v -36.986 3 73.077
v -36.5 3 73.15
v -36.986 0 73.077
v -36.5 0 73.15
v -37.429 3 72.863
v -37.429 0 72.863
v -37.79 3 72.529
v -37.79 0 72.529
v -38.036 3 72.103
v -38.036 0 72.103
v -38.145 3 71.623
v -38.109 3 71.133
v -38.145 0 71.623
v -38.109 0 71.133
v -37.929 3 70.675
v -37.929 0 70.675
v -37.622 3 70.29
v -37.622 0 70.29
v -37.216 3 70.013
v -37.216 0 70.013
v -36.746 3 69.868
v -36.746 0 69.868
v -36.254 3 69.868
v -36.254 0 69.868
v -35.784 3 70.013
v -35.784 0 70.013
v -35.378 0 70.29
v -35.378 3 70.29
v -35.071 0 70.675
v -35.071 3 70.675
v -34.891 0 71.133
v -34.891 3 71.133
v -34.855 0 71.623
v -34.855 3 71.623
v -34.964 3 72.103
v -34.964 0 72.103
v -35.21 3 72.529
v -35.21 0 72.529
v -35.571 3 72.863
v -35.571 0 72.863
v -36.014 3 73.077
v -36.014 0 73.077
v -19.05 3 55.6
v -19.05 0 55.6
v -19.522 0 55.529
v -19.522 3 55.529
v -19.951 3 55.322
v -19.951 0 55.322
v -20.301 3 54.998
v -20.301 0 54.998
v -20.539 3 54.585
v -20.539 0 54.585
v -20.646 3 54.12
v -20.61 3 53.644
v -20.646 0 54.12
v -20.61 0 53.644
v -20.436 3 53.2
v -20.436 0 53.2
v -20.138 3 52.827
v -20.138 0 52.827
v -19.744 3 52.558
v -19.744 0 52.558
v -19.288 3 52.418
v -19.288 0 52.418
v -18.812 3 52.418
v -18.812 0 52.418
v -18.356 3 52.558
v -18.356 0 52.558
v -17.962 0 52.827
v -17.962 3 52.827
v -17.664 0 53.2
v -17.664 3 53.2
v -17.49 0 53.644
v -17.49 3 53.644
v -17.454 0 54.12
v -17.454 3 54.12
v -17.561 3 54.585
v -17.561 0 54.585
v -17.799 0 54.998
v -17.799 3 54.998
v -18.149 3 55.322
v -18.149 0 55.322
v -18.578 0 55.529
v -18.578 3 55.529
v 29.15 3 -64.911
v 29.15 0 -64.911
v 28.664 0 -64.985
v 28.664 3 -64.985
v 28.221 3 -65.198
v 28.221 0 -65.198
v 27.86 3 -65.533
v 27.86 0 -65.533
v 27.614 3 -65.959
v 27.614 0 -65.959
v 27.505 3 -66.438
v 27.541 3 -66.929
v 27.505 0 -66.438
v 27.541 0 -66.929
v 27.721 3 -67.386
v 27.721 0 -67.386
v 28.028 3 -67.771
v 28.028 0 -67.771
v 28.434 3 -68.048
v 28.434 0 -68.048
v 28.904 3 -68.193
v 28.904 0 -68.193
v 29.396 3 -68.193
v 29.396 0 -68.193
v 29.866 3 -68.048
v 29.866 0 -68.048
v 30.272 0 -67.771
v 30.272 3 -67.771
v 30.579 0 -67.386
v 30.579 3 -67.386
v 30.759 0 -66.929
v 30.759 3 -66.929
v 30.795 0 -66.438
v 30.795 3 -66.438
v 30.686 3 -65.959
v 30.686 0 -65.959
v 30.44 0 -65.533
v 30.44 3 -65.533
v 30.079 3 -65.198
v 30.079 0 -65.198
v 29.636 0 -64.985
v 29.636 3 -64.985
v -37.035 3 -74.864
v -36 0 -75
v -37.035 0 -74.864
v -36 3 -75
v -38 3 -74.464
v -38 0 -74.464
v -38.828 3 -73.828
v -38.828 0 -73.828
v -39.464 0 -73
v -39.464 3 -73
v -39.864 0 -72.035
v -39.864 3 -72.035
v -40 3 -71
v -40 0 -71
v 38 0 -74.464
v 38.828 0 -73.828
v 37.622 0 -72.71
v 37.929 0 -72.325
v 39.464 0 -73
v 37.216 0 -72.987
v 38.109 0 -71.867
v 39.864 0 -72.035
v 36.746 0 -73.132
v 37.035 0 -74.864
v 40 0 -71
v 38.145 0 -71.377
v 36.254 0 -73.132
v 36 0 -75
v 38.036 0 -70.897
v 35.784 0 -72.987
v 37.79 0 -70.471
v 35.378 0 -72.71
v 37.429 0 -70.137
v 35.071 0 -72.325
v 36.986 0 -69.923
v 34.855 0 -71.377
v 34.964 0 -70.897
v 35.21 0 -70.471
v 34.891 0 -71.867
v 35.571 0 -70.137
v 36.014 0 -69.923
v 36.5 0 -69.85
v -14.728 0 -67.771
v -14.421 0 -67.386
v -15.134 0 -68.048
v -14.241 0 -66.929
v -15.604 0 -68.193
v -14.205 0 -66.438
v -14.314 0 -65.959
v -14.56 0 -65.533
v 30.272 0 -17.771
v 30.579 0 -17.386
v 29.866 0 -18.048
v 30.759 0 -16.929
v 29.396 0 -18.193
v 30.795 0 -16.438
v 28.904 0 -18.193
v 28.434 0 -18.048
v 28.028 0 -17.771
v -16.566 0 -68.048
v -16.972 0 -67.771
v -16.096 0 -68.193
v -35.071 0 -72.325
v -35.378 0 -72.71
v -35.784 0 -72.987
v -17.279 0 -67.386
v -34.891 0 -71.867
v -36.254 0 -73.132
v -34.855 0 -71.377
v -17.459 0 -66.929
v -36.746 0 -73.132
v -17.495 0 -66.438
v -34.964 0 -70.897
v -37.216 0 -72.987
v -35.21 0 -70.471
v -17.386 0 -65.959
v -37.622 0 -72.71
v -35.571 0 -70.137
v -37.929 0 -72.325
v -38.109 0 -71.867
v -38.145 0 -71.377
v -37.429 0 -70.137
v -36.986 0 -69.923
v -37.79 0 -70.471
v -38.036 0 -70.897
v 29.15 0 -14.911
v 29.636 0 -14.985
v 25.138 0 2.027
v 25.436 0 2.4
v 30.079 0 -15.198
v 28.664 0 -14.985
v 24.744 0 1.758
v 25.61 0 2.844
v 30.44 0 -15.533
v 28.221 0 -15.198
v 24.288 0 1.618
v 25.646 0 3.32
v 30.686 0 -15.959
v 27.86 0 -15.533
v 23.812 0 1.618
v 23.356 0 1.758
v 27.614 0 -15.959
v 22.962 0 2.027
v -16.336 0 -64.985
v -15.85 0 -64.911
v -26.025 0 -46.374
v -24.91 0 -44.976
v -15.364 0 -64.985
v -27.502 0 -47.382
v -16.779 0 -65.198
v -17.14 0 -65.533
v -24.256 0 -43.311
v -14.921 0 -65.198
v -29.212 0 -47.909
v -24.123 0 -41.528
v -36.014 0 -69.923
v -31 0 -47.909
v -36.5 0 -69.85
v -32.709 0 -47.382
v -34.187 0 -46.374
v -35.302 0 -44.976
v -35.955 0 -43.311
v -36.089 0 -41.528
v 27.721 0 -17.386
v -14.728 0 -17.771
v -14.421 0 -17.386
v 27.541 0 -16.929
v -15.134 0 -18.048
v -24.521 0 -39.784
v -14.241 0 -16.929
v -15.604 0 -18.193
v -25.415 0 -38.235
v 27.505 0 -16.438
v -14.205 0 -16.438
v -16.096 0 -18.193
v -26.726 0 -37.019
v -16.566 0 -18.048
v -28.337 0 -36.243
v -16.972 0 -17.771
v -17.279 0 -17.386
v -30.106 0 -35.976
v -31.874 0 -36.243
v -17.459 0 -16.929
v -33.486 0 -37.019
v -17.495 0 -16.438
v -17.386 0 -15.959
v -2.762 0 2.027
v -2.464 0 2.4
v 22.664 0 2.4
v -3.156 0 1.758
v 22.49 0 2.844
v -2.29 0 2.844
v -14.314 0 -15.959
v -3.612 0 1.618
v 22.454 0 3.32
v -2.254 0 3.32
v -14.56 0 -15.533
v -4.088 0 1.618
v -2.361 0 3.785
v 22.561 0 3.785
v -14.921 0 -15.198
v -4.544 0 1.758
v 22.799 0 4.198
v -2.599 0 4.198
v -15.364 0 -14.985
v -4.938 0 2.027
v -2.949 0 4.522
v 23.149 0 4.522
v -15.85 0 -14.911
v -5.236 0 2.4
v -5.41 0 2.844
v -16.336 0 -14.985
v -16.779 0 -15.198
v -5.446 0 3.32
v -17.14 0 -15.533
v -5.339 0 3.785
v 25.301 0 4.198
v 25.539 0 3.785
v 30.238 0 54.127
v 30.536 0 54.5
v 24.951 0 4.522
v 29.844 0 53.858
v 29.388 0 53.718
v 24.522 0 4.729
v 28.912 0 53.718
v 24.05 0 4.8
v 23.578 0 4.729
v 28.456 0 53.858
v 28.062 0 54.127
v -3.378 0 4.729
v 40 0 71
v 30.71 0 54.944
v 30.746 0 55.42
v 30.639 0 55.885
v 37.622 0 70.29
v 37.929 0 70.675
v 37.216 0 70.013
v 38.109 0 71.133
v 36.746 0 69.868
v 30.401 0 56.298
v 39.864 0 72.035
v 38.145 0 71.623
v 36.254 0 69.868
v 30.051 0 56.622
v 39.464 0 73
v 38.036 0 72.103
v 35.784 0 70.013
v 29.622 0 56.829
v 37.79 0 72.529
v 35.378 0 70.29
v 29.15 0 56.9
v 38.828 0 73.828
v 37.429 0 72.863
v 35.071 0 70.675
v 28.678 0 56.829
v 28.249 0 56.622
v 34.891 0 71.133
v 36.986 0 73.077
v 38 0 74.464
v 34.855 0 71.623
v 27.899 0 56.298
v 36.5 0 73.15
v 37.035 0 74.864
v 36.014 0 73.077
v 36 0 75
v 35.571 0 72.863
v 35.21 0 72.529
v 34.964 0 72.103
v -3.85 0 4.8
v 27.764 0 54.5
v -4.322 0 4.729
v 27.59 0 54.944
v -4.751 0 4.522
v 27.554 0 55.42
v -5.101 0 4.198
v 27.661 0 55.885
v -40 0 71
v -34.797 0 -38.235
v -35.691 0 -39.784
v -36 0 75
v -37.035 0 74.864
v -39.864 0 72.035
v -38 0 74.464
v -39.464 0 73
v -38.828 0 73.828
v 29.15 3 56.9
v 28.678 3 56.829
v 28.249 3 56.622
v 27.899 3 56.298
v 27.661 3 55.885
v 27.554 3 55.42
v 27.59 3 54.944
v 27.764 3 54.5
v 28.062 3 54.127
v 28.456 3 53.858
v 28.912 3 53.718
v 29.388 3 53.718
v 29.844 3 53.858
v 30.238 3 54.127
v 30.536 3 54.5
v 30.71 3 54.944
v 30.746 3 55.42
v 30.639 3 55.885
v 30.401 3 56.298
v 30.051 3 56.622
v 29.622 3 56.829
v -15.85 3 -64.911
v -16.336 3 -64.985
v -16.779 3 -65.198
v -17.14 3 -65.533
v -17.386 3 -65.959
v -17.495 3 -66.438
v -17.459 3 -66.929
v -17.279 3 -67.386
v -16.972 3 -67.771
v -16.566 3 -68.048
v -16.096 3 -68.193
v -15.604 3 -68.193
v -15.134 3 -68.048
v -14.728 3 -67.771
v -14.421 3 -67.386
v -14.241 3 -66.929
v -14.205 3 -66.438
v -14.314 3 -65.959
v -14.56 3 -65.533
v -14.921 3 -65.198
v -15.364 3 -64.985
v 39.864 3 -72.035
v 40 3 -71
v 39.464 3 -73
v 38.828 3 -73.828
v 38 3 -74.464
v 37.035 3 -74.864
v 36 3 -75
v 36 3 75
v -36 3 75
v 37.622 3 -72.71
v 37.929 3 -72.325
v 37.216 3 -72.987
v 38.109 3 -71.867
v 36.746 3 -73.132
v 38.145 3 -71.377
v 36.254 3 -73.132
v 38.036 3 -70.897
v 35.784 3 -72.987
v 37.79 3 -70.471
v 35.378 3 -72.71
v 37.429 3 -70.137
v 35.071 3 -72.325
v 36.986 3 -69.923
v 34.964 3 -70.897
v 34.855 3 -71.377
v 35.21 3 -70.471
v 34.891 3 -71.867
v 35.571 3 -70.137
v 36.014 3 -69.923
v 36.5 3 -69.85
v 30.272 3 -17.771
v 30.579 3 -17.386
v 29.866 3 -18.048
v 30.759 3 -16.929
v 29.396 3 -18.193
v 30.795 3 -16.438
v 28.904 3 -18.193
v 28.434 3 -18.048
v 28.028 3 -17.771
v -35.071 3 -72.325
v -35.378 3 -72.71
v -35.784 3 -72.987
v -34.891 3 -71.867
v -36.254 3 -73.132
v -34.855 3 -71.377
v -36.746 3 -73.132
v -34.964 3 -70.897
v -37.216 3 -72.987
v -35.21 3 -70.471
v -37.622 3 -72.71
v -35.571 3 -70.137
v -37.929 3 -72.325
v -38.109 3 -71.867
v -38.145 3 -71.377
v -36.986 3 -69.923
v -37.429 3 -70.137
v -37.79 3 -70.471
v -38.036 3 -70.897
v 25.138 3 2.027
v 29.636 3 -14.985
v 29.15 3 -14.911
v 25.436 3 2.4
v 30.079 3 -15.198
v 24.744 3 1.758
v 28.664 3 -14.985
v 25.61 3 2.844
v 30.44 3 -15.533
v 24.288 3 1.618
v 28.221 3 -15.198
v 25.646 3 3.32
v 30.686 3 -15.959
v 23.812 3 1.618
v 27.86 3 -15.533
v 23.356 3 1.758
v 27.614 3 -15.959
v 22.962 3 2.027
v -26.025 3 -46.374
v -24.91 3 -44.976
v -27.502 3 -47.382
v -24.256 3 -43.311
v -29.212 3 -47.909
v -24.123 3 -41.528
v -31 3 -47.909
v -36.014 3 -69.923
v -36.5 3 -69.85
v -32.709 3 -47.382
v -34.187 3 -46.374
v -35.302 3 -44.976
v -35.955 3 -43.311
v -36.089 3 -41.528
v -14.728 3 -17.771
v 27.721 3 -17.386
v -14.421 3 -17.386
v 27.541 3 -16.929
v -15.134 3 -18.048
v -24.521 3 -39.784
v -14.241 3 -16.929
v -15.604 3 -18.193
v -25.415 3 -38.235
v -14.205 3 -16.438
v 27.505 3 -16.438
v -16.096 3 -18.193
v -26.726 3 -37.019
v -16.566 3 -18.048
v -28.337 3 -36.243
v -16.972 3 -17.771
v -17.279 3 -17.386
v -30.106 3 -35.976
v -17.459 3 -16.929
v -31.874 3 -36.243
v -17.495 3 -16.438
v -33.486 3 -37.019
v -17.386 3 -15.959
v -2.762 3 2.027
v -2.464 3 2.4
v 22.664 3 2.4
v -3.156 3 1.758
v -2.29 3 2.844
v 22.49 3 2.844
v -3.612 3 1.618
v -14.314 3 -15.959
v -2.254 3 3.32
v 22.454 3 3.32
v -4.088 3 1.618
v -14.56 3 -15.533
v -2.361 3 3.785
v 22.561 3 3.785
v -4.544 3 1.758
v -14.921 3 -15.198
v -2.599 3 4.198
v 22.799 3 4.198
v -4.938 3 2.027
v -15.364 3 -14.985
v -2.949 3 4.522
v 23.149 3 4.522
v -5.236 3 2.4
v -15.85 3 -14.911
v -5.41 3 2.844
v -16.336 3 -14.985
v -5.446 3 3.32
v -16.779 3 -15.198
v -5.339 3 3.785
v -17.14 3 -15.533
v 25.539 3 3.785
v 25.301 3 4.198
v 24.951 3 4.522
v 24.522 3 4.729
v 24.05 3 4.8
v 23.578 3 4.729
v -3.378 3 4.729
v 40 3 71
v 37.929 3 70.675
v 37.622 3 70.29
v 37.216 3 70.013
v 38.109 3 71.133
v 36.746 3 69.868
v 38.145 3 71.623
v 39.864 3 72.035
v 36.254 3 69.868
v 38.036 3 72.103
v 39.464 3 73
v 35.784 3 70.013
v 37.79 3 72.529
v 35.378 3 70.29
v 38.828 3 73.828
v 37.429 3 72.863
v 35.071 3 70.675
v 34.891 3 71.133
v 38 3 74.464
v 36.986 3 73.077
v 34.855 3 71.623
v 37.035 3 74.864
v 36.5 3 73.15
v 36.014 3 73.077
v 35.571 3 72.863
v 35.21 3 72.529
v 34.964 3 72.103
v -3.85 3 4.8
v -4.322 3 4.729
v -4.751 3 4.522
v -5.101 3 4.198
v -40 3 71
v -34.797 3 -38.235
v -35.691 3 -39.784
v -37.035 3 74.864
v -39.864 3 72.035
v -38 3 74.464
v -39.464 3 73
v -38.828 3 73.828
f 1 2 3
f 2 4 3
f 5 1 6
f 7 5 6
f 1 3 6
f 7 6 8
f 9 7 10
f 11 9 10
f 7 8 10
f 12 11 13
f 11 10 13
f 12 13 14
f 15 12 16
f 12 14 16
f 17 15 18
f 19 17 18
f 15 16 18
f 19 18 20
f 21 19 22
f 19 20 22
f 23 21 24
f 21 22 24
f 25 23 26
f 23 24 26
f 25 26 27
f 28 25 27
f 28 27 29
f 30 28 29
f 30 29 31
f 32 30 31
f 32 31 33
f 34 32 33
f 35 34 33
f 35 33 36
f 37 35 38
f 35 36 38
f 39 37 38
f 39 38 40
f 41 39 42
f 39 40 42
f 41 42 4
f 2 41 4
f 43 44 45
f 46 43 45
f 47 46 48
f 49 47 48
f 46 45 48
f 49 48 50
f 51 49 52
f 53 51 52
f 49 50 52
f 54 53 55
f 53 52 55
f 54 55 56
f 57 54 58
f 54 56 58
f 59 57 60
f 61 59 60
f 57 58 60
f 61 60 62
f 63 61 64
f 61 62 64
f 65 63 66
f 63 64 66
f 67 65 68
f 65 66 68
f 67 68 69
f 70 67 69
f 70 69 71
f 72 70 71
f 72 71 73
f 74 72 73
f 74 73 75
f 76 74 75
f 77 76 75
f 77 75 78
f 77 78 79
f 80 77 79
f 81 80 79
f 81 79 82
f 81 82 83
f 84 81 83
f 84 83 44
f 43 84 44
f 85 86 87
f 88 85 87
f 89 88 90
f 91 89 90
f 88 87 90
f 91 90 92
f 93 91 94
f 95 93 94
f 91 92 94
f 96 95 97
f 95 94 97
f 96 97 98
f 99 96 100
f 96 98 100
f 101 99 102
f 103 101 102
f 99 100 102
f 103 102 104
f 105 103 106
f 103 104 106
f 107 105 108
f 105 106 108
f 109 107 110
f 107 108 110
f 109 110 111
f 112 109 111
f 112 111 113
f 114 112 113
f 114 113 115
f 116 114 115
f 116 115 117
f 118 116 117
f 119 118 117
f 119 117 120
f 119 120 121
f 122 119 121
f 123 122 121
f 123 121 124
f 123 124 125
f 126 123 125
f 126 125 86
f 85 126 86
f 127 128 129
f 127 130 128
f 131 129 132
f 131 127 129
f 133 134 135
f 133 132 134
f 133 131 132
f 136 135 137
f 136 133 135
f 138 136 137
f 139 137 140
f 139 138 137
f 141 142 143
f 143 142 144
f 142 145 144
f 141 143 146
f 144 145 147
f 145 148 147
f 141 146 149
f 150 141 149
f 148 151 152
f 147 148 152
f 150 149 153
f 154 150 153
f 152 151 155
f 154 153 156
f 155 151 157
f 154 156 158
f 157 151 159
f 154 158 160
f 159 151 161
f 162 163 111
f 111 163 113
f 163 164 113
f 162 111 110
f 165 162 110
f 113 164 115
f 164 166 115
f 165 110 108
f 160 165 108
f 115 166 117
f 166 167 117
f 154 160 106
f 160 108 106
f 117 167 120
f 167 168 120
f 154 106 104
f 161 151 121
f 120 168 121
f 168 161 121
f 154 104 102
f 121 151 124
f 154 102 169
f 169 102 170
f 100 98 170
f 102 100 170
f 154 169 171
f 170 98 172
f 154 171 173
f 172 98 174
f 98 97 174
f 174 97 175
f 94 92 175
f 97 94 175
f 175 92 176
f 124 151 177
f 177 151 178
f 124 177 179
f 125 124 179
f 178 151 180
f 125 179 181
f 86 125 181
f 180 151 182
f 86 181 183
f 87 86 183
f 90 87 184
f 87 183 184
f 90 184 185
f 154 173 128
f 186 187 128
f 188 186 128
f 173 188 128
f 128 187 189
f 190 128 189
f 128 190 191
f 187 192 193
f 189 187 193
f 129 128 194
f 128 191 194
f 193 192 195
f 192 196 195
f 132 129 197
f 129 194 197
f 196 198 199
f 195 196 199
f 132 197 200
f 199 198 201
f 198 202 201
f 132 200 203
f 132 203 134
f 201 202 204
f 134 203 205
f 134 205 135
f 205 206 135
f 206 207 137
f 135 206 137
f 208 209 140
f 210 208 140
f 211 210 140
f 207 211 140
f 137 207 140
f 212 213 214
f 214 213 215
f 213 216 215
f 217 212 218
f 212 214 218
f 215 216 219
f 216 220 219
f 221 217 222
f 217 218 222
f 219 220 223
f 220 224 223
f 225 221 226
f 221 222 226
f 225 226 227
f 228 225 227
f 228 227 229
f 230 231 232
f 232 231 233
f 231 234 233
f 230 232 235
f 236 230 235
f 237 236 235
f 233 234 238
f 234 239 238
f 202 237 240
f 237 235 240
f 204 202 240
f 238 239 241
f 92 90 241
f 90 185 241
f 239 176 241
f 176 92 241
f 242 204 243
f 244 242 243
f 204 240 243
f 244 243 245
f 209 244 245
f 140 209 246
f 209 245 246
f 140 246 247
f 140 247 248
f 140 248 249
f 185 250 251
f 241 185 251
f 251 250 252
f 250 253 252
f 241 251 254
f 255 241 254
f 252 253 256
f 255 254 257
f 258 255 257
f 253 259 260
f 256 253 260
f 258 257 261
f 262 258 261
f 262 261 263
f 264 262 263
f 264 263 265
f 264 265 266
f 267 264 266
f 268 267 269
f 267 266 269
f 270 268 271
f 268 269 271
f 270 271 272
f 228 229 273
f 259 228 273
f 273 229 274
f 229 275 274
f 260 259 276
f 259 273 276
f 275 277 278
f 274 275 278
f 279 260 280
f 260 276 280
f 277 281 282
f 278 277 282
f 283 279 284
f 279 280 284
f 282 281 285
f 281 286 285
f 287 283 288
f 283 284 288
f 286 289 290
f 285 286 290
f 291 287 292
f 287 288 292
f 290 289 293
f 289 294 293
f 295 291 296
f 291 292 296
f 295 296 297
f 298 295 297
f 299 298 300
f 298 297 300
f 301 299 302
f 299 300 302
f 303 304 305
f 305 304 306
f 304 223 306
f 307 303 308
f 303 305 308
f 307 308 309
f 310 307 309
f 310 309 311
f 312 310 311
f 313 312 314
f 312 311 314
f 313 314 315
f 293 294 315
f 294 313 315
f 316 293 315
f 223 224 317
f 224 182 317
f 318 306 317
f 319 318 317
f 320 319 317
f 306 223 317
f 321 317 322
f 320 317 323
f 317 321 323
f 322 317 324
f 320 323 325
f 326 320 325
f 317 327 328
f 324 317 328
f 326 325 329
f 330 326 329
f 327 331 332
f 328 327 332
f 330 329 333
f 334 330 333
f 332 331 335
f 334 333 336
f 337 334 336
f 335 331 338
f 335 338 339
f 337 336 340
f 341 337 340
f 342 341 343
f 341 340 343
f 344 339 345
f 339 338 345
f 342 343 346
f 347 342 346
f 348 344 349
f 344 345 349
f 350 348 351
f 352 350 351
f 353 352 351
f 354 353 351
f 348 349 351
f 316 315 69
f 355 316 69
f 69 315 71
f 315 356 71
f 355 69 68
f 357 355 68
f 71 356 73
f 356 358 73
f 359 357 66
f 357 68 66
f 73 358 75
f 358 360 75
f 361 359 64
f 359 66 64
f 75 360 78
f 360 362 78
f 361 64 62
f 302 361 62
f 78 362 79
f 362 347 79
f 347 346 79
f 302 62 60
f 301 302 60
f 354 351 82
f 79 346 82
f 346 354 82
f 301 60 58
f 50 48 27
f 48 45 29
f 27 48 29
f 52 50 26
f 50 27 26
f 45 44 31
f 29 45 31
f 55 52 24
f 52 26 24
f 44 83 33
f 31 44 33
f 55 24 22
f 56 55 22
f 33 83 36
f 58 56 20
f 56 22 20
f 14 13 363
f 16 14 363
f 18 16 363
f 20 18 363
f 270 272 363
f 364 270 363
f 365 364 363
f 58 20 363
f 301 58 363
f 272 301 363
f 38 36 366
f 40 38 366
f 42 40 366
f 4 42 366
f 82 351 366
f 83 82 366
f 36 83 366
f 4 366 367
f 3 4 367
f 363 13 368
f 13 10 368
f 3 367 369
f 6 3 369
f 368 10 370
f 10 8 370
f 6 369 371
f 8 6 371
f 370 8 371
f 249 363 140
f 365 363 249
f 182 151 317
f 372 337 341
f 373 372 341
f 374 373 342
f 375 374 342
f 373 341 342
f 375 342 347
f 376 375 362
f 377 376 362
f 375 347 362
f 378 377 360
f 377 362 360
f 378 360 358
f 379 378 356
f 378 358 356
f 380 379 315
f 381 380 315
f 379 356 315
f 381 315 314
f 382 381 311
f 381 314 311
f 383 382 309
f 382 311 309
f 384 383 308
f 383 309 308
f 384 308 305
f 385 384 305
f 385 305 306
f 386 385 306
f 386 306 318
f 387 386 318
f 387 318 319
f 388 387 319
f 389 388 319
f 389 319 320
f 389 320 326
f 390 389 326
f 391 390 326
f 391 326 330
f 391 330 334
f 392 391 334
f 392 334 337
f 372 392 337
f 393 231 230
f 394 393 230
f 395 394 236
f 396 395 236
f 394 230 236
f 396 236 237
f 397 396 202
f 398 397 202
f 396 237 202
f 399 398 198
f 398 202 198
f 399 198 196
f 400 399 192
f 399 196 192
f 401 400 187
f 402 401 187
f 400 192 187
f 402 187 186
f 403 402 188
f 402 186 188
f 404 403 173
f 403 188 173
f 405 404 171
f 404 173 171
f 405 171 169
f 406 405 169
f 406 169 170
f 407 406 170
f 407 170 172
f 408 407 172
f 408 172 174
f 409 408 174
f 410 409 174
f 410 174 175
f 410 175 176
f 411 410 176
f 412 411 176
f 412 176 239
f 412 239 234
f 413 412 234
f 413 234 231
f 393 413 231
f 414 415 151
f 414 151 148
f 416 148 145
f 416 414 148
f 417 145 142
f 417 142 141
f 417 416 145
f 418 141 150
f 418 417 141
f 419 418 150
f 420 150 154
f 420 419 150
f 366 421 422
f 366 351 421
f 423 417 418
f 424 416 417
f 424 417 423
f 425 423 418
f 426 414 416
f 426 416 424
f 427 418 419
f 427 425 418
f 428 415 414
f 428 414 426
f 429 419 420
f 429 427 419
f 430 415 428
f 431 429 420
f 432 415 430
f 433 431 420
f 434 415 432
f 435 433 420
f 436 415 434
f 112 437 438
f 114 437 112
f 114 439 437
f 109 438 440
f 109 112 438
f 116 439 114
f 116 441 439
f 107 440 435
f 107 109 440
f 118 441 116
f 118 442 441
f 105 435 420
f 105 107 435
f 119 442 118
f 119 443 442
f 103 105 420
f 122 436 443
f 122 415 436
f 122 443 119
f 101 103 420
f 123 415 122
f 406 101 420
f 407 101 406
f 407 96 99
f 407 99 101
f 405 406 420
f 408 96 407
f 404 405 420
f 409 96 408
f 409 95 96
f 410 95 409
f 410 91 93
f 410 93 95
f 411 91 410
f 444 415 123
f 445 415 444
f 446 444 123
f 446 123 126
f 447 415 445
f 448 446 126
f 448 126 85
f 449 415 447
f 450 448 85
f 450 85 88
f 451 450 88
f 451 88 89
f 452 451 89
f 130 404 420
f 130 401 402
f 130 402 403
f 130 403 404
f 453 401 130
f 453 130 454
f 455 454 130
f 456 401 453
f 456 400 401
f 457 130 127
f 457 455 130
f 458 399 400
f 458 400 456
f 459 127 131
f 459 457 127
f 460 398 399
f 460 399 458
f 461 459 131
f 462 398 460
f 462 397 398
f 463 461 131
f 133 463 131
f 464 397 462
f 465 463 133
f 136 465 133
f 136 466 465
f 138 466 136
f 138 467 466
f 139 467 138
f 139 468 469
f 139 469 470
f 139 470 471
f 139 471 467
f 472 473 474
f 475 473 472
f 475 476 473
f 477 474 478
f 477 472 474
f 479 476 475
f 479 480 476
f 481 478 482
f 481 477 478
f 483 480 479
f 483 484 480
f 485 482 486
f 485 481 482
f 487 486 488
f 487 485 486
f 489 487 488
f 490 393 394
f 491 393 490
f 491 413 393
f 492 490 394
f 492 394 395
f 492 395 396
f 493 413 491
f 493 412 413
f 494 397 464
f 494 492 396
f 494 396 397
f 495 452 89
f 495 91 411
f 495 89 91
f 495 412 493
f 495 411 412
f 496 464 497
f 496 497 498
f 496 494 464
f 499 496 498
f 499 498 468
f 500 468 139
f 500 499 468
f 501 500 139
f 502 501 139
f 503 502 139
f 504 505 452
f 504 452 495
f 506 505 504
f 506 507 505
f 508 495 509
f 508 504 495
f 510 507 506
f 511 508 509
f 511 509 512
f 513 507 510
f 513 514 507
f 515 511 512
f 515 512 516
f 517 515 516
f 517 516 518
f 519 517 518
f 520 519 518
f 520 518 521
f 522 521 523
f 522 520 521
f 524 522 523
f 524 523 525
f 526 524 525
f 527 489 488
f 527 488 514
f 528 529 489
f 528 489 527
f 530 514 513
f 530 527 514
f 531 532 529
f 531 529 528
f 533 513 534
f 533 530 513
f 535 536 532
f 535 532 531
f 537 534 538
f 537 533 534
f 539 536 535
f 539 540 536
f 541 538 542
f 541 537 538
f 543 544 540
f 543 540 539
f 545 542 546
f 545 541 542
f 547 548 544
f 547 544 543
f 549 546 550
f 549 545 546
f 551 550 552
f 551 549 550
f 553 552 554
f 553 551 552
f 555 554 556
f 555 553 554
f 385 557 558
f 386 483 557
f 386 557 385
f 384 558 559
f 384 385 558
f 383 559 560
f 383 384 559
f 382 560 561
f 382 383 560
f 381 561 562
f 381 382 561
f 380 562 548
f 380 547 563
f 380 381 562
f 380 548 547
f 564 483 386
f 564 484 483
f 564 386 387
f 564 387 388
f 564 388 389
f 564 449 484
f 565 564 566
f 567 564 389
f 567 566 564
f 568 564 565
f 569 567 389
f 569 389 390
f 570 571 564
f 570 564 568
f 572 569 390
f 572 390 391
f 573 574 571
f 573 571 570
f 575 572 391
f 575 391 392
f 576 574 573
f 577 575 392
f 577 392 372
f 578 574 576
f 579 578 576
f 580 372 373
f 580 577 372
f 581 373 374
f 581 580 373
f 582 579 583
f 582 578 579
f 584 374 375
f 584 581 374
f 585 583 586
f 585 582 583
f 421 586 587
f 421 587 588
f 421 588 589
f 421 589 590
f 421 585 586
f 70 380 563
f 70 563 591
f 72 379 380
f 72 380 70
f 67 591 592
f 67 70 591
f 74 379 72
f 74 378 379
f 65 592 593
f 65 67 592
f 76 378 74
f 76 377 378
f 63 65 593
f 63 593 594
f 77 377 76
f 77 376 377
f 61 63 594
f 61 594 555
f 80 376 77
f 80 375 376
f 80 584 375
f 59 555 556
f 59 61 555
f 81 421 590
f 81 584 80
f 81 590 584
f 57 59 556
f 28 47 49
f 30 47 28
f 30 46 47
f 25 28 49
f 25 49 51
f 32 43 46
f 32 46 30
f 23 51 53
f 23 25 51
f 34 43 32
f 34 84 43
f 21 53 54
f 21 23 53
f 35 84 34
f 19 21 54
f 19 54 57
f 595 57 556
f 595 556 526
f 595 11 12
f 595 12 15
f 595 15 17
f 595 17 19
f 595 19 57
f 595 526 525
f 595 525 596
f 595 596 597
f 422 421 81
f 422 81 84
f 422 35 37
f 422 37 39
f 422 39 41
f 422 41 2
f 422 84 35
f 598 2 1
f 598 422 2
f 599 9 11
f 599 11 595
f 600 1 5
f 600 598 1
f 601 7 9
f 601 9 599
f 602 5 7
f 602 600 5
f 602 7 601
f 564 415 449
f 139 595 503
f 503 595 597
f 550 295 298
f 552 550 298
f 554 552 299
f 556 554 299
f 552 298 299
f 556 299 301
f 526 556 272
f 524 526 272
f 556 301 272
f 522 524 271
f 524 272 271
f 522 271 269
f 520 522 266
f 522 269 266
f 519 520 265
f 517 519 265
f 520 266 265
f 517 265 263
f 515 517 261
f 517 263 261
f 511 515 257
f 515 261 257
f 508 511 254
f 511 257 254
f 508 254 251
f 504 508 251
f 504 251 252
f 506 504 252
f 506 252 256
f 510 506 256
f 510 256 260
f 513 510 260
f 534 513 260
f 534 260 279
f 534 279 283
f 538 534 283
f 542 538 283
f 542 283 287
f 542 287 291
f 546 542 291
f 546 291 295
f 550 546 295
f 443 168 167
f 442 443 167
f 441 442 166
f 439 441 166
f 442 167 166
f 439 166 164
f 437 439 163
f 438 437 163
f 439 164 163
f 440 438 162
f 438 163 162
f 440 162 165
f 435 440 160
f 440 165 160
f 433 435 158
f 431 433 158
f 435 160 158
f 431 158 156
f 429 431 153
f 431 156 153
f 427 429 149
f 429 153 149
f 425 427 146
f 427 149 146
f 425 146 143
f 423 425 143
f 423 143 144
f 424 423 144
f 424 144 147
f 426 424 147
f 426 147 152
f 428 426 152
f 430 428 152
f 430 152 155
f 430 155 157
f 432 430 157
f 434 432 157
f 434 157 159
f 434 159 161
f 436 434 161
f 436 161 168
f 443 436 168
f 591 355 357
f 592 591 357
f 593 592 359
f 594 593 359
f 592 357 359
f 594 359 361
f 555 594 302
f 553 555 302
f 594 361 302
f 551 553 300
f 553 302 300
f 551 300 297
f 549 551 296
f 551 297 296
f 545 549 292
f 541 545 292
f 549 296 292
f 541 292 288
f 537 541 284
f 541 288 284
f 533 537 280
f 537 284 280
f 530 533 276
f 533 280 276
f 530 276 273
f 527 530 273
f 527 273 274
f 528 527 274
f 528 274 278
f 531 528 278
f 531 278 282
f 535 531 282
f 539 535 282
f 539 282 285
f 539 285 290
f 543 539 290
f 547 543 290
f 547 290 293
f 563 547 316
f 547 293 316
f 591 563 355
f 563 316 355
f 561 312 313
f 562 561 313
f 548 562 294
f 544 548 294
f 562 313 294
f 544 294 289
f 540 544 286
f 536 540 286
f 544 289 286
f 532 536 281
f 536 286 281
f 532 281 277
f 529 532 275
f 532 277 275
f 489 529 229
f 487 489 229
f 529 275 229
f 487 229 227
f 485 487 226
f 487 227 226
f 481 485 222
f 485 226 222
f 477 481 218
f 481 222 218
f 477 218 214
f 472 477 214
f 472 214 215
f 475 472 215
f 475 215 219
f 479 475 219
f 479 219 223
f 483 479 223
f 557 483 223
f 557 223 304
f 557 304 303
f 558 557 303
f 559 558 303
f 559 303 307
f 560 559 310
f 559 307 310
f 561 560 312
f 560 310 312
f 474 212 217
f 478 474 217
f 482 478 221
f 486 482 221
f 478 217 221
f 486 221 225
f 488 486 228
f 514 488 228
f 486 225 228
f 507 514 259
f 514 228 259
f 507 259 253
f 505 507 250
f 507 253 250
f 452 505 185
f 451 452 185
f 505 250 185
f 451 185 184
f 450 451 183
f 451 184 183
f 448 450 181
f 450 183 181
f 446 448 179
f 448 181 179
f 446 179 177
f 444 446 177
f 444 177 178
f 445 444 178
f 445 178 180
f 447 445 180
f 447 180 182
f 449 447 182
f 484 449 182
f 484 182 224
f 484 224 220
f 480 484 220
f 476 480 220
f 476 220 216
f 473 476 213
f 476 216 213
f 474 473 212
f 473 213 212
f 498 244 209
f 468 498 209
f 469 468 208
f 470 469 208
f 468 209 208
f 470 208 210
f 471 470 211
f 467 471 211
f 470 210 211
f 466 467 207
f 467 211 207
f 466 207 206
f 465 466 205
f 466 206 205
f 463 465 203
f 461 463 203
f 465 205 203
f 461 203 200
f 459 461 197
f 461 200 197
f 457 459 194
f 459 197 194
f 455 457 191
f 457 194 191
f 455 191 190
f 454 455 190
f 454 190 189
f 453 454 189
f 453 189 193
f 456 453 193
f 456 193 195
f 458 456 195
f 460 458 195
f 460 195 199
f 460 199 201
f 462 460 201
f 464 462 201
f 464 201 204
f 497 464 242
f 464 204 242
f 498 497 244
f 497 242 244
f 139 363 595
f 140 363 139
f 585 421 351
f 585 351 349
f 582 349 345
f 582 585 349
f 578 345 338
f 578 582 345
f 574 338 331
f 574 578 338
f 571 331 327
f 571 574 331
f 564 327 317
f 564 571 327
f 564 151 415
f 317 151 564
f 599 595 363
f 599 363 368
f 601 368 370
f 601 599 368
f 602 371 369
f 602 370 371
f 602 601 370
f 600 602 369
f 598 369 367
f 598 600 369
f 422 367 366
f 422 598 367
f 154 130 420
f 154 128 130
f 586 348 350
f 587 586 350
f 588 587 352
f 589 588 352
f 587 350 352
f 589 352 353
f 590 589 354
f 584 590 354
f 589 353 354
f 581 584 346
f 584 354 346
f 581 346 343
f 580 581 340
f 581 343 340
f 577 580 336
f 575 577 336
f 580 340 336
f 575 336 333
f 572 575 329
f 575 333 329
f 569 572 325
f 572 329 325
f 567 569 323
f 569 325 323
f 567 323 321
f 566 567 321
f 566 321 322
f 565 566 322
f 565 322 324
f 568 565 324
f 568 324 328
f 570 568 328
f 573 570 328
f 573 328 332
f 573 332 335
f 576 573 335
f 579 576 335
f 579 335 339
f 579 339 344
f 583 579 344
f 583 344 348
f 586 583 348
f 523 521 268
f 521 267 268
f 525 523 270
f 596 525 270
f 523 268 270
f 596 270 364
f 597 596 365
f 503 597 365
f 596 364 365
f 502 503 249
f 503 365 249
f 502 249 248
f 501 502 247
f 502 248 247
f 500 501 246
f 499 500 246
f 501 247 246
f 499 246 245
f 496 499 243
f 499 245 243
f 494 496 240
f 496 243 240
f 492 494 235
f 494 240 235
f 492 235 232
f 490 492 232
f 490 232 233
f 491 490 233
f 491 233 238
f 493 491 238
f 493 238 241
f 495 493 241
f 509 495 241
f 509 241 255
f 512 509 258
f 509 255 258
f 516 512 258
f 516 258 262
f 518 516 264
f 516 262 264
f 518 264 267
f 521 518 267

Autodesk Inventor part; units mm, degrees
ref_plane "YZ Plane" through (0, 0, 0) normal (1, 0, 0) x (0, 1, 0)
ref_plane "XZ Plane" through (0, 0, 0) normal (0, 1, 0) x (-1, 0, 0)
ref_plane "XY Plane" through (0, 0, 0) normal (0, 0, 1) x (1, 0, 0)
sketch "Sketch1" plane through (0, 0, 0) normal (0, 1, 0) x (-1, 0, 0)
  line L0 (-40, 75) -> (40, 75)
  line L1 (40, 75) -> (40, -75)
  line L2 (40, -75) -> (-40, -75)
  line L3 (-40, -75) -> (-40, 75)
  line L4 (-40, 75) -> (40, -75) construction
  line L5 (40, 75) -> (-40, -75) construction
  point P0 (0, 0)
  dimension "d0" = 80
  dimension "d1" = 150
extrude "Extrusion1" add sketch "Sketch1" along normal blind 3
sketch "Sketch2" plane through (0, 3, 0) normal (0, 1, 0) x (1, 0, 0)
  line L0 (-40, -75) -> (40, -75) construction
  line L1 (0, -75) -> (0, 75) construction
  line L2 (40, 75) -> (-40, 75) construction
  line L3 (40, -75) -> (40, 75) construction
  line L4 (40, 0) -> (-40, 0) construction
  line L5 (-40, 75) -> (-40, -75) construction
  line L6 (0, -75) -> (40, -75) construction
  line L7 (40, -75) -> (5, -75) construction
  line L8 (5, -75) -> (5, -35) construction
  line L9 (31.65, -69.3) -> (-21.65, -69.3) construction
  line L10 (-21.65, -69.3) -> (-21.65, -0.7) construction
  line L11 (-21.65, -0.7) -> (31.65, -0.7) construction
  line L12 (31.65, -0.7) -> (31.65, -69.3) construction
  line L13 (31.65, -69.3) -> (-21.65, -0.7) construction
  line L14 (-21.65, -69.3) -> (31.65, -0.7) construction
  line L15 (5, -69.3) -> (5, -55.3) construction
  line L16 (5, -55.3) -> (-21.65, -55.3) construction
  line L17 (5, -55.3) -> (31.65, -55.3) construction
  line L18 (-21.65, -54) -> (5, -54) construction
  line L19 (5, -54) -> (31.65, -54) construction
  line L20 (-21.65, -3.2) -> (5, -3.2) construction
  line L21 (5, -3.2) -> (31.65, -3.2) construction
  line L22 (31.65, -35) -> (29.15, -35) construction
  line L23 (29.15, -35) -> (29.15, -0.7) construction
  line L24 (29.15, -35) -> (29.15, -69.3) construction
  line L25 (24.05, -0.7) -> (24.05, -35) construction
  line L26 (24.05, -35) -> (24.05, -69.3) construction
  line L27 (-3.85, -0.7) -> (-3.85, -35) construction
  line L28 (-3.85, -35) -> (-3.85, -69.3) construction
  line L29 (-19.05, -0.7) -> (-19.05, -35) construction
  line L30 (-19.05, -35) -> (-19.05, -69.3) construction
  point P0 (0, 0)
  point P1 (-19.05, -54)
  point P2 (29.15, -55.3)
  point P3 (24.05, -3.2)
  point P4 (-3.85, -3.2)
  dimension "d4" = 35
  dimension "d5" = 40
  dimension "d6" = 53.3
  dimension "d7" = 68.6
  dimension "d8" = 14
  dimension "d9" = 1.3
  dimension "d10" = 50.8
  dimension "d11" = 2.5
  dimension "d12" = 5.1
  dimension "d13" = 27.9
  dimension "d14" = 15.2
hole "Hole1" at (-19.05, 3, 54) at (29.15, 3, 55.3) at (24.05, 3, 3.2) at (-3.85, 3, 3.2) direction (0, -1, 0) diameter 3.2 end through all
sketch "Sketch3" plane through (0, 3, 0) normal (0, 1, 0) x (1, 0, 0)
  line L0 (40, 75) -> (40, -75) construction
  line L1 (40, 75) -> (6.65, 75) construction
  line L2 (-40, 75) -> (40, 75) construction
  line L3 (6.65, 75) -> (6.65, 55) construction
  line L4 (-15.85, 16.5614) -> (29.15, 16.5614) construction
  line L5 (29.15, 16.5614) -> (29.15, 66.5614) construction
  line L6 (29.15, 66.5614) -> (-15.85, 66.5614) construction
  line L7 (-15.85, 66.5614) -> (-15.85, 16.5614) construction
  line L8 (-15.85, 16.5614) -> (29.15, 66.5614) construction
  line L9 (29.15, 16.5614) -> (-15.85, 66.5614) construction
  circle A0 centre (29.15, -55.3) radius 1.6 construction
  line L10 (29.15, -55.3) -> (40, -55.3) construction
  line L11 (29.15, -55.3) -> (29.15, 104.0464) construction
  point P0 (0, 0)
  point P1 (6.65, 41.5614)
  dimension "d22" = 33.35
  dimension "d23" = 20
  dimension "d24" = 45
  dimension "d25" = 50
  dimension "d26" = 10.85
  dimension "d27" = 10.85
hole "Hole2" at (-15.85, 3, -16.5614) at (-15.85, 3, -66.5614) at (29.15, 3, -16.5614) at (29.15, 3, -66.5614) direction (0, -1, 0) diameter 3.3 end through all
fillet "Fillet1" radius 4 4 edges at (40, 1.5, 75) (-40, 1.5, 75) (40, 1.5, -75) (-40, 1.5, -75)
sketch "Sketch4" plane through (0, 3, 0) normal (0, 1, 0) x (1, 0, 0)
  line L0 (-40, -75) -> (40, -75) projected
  line L1 (-40, 75) -> (-40, -75) projected
  line L2 (40, 75) -> (-40, 75) projected
  line L3 (40, -75) -> (40, 75) projected
  line L4 (36.5, 71.5) -> (-36.5, 71.5) construction
  line L5 (-36.5, 71.5) -> (-36.5, -71.5) construction
  line L6 (-36.5, -71.5) -> (36.5, -71.5) construction
  line L7 (36.5, -71.5) -> (36.5, 71.5) construction
  point P0 (0, 0)
  dimension "d36" = 3.5
hole "Hole3" at (-36.5, 3, 71.5) at (36.5, 3, 71.5) at (36.5, 3, -71.5) at (-36.5, 3, -71.5) direction (0, -1, 0) diameter 3.3 end through all
hole "Hole4" at (-30.1058, 3, -41.9761) direction (0, -1, 0) diameter 12 end through all
properties part number "plate"
